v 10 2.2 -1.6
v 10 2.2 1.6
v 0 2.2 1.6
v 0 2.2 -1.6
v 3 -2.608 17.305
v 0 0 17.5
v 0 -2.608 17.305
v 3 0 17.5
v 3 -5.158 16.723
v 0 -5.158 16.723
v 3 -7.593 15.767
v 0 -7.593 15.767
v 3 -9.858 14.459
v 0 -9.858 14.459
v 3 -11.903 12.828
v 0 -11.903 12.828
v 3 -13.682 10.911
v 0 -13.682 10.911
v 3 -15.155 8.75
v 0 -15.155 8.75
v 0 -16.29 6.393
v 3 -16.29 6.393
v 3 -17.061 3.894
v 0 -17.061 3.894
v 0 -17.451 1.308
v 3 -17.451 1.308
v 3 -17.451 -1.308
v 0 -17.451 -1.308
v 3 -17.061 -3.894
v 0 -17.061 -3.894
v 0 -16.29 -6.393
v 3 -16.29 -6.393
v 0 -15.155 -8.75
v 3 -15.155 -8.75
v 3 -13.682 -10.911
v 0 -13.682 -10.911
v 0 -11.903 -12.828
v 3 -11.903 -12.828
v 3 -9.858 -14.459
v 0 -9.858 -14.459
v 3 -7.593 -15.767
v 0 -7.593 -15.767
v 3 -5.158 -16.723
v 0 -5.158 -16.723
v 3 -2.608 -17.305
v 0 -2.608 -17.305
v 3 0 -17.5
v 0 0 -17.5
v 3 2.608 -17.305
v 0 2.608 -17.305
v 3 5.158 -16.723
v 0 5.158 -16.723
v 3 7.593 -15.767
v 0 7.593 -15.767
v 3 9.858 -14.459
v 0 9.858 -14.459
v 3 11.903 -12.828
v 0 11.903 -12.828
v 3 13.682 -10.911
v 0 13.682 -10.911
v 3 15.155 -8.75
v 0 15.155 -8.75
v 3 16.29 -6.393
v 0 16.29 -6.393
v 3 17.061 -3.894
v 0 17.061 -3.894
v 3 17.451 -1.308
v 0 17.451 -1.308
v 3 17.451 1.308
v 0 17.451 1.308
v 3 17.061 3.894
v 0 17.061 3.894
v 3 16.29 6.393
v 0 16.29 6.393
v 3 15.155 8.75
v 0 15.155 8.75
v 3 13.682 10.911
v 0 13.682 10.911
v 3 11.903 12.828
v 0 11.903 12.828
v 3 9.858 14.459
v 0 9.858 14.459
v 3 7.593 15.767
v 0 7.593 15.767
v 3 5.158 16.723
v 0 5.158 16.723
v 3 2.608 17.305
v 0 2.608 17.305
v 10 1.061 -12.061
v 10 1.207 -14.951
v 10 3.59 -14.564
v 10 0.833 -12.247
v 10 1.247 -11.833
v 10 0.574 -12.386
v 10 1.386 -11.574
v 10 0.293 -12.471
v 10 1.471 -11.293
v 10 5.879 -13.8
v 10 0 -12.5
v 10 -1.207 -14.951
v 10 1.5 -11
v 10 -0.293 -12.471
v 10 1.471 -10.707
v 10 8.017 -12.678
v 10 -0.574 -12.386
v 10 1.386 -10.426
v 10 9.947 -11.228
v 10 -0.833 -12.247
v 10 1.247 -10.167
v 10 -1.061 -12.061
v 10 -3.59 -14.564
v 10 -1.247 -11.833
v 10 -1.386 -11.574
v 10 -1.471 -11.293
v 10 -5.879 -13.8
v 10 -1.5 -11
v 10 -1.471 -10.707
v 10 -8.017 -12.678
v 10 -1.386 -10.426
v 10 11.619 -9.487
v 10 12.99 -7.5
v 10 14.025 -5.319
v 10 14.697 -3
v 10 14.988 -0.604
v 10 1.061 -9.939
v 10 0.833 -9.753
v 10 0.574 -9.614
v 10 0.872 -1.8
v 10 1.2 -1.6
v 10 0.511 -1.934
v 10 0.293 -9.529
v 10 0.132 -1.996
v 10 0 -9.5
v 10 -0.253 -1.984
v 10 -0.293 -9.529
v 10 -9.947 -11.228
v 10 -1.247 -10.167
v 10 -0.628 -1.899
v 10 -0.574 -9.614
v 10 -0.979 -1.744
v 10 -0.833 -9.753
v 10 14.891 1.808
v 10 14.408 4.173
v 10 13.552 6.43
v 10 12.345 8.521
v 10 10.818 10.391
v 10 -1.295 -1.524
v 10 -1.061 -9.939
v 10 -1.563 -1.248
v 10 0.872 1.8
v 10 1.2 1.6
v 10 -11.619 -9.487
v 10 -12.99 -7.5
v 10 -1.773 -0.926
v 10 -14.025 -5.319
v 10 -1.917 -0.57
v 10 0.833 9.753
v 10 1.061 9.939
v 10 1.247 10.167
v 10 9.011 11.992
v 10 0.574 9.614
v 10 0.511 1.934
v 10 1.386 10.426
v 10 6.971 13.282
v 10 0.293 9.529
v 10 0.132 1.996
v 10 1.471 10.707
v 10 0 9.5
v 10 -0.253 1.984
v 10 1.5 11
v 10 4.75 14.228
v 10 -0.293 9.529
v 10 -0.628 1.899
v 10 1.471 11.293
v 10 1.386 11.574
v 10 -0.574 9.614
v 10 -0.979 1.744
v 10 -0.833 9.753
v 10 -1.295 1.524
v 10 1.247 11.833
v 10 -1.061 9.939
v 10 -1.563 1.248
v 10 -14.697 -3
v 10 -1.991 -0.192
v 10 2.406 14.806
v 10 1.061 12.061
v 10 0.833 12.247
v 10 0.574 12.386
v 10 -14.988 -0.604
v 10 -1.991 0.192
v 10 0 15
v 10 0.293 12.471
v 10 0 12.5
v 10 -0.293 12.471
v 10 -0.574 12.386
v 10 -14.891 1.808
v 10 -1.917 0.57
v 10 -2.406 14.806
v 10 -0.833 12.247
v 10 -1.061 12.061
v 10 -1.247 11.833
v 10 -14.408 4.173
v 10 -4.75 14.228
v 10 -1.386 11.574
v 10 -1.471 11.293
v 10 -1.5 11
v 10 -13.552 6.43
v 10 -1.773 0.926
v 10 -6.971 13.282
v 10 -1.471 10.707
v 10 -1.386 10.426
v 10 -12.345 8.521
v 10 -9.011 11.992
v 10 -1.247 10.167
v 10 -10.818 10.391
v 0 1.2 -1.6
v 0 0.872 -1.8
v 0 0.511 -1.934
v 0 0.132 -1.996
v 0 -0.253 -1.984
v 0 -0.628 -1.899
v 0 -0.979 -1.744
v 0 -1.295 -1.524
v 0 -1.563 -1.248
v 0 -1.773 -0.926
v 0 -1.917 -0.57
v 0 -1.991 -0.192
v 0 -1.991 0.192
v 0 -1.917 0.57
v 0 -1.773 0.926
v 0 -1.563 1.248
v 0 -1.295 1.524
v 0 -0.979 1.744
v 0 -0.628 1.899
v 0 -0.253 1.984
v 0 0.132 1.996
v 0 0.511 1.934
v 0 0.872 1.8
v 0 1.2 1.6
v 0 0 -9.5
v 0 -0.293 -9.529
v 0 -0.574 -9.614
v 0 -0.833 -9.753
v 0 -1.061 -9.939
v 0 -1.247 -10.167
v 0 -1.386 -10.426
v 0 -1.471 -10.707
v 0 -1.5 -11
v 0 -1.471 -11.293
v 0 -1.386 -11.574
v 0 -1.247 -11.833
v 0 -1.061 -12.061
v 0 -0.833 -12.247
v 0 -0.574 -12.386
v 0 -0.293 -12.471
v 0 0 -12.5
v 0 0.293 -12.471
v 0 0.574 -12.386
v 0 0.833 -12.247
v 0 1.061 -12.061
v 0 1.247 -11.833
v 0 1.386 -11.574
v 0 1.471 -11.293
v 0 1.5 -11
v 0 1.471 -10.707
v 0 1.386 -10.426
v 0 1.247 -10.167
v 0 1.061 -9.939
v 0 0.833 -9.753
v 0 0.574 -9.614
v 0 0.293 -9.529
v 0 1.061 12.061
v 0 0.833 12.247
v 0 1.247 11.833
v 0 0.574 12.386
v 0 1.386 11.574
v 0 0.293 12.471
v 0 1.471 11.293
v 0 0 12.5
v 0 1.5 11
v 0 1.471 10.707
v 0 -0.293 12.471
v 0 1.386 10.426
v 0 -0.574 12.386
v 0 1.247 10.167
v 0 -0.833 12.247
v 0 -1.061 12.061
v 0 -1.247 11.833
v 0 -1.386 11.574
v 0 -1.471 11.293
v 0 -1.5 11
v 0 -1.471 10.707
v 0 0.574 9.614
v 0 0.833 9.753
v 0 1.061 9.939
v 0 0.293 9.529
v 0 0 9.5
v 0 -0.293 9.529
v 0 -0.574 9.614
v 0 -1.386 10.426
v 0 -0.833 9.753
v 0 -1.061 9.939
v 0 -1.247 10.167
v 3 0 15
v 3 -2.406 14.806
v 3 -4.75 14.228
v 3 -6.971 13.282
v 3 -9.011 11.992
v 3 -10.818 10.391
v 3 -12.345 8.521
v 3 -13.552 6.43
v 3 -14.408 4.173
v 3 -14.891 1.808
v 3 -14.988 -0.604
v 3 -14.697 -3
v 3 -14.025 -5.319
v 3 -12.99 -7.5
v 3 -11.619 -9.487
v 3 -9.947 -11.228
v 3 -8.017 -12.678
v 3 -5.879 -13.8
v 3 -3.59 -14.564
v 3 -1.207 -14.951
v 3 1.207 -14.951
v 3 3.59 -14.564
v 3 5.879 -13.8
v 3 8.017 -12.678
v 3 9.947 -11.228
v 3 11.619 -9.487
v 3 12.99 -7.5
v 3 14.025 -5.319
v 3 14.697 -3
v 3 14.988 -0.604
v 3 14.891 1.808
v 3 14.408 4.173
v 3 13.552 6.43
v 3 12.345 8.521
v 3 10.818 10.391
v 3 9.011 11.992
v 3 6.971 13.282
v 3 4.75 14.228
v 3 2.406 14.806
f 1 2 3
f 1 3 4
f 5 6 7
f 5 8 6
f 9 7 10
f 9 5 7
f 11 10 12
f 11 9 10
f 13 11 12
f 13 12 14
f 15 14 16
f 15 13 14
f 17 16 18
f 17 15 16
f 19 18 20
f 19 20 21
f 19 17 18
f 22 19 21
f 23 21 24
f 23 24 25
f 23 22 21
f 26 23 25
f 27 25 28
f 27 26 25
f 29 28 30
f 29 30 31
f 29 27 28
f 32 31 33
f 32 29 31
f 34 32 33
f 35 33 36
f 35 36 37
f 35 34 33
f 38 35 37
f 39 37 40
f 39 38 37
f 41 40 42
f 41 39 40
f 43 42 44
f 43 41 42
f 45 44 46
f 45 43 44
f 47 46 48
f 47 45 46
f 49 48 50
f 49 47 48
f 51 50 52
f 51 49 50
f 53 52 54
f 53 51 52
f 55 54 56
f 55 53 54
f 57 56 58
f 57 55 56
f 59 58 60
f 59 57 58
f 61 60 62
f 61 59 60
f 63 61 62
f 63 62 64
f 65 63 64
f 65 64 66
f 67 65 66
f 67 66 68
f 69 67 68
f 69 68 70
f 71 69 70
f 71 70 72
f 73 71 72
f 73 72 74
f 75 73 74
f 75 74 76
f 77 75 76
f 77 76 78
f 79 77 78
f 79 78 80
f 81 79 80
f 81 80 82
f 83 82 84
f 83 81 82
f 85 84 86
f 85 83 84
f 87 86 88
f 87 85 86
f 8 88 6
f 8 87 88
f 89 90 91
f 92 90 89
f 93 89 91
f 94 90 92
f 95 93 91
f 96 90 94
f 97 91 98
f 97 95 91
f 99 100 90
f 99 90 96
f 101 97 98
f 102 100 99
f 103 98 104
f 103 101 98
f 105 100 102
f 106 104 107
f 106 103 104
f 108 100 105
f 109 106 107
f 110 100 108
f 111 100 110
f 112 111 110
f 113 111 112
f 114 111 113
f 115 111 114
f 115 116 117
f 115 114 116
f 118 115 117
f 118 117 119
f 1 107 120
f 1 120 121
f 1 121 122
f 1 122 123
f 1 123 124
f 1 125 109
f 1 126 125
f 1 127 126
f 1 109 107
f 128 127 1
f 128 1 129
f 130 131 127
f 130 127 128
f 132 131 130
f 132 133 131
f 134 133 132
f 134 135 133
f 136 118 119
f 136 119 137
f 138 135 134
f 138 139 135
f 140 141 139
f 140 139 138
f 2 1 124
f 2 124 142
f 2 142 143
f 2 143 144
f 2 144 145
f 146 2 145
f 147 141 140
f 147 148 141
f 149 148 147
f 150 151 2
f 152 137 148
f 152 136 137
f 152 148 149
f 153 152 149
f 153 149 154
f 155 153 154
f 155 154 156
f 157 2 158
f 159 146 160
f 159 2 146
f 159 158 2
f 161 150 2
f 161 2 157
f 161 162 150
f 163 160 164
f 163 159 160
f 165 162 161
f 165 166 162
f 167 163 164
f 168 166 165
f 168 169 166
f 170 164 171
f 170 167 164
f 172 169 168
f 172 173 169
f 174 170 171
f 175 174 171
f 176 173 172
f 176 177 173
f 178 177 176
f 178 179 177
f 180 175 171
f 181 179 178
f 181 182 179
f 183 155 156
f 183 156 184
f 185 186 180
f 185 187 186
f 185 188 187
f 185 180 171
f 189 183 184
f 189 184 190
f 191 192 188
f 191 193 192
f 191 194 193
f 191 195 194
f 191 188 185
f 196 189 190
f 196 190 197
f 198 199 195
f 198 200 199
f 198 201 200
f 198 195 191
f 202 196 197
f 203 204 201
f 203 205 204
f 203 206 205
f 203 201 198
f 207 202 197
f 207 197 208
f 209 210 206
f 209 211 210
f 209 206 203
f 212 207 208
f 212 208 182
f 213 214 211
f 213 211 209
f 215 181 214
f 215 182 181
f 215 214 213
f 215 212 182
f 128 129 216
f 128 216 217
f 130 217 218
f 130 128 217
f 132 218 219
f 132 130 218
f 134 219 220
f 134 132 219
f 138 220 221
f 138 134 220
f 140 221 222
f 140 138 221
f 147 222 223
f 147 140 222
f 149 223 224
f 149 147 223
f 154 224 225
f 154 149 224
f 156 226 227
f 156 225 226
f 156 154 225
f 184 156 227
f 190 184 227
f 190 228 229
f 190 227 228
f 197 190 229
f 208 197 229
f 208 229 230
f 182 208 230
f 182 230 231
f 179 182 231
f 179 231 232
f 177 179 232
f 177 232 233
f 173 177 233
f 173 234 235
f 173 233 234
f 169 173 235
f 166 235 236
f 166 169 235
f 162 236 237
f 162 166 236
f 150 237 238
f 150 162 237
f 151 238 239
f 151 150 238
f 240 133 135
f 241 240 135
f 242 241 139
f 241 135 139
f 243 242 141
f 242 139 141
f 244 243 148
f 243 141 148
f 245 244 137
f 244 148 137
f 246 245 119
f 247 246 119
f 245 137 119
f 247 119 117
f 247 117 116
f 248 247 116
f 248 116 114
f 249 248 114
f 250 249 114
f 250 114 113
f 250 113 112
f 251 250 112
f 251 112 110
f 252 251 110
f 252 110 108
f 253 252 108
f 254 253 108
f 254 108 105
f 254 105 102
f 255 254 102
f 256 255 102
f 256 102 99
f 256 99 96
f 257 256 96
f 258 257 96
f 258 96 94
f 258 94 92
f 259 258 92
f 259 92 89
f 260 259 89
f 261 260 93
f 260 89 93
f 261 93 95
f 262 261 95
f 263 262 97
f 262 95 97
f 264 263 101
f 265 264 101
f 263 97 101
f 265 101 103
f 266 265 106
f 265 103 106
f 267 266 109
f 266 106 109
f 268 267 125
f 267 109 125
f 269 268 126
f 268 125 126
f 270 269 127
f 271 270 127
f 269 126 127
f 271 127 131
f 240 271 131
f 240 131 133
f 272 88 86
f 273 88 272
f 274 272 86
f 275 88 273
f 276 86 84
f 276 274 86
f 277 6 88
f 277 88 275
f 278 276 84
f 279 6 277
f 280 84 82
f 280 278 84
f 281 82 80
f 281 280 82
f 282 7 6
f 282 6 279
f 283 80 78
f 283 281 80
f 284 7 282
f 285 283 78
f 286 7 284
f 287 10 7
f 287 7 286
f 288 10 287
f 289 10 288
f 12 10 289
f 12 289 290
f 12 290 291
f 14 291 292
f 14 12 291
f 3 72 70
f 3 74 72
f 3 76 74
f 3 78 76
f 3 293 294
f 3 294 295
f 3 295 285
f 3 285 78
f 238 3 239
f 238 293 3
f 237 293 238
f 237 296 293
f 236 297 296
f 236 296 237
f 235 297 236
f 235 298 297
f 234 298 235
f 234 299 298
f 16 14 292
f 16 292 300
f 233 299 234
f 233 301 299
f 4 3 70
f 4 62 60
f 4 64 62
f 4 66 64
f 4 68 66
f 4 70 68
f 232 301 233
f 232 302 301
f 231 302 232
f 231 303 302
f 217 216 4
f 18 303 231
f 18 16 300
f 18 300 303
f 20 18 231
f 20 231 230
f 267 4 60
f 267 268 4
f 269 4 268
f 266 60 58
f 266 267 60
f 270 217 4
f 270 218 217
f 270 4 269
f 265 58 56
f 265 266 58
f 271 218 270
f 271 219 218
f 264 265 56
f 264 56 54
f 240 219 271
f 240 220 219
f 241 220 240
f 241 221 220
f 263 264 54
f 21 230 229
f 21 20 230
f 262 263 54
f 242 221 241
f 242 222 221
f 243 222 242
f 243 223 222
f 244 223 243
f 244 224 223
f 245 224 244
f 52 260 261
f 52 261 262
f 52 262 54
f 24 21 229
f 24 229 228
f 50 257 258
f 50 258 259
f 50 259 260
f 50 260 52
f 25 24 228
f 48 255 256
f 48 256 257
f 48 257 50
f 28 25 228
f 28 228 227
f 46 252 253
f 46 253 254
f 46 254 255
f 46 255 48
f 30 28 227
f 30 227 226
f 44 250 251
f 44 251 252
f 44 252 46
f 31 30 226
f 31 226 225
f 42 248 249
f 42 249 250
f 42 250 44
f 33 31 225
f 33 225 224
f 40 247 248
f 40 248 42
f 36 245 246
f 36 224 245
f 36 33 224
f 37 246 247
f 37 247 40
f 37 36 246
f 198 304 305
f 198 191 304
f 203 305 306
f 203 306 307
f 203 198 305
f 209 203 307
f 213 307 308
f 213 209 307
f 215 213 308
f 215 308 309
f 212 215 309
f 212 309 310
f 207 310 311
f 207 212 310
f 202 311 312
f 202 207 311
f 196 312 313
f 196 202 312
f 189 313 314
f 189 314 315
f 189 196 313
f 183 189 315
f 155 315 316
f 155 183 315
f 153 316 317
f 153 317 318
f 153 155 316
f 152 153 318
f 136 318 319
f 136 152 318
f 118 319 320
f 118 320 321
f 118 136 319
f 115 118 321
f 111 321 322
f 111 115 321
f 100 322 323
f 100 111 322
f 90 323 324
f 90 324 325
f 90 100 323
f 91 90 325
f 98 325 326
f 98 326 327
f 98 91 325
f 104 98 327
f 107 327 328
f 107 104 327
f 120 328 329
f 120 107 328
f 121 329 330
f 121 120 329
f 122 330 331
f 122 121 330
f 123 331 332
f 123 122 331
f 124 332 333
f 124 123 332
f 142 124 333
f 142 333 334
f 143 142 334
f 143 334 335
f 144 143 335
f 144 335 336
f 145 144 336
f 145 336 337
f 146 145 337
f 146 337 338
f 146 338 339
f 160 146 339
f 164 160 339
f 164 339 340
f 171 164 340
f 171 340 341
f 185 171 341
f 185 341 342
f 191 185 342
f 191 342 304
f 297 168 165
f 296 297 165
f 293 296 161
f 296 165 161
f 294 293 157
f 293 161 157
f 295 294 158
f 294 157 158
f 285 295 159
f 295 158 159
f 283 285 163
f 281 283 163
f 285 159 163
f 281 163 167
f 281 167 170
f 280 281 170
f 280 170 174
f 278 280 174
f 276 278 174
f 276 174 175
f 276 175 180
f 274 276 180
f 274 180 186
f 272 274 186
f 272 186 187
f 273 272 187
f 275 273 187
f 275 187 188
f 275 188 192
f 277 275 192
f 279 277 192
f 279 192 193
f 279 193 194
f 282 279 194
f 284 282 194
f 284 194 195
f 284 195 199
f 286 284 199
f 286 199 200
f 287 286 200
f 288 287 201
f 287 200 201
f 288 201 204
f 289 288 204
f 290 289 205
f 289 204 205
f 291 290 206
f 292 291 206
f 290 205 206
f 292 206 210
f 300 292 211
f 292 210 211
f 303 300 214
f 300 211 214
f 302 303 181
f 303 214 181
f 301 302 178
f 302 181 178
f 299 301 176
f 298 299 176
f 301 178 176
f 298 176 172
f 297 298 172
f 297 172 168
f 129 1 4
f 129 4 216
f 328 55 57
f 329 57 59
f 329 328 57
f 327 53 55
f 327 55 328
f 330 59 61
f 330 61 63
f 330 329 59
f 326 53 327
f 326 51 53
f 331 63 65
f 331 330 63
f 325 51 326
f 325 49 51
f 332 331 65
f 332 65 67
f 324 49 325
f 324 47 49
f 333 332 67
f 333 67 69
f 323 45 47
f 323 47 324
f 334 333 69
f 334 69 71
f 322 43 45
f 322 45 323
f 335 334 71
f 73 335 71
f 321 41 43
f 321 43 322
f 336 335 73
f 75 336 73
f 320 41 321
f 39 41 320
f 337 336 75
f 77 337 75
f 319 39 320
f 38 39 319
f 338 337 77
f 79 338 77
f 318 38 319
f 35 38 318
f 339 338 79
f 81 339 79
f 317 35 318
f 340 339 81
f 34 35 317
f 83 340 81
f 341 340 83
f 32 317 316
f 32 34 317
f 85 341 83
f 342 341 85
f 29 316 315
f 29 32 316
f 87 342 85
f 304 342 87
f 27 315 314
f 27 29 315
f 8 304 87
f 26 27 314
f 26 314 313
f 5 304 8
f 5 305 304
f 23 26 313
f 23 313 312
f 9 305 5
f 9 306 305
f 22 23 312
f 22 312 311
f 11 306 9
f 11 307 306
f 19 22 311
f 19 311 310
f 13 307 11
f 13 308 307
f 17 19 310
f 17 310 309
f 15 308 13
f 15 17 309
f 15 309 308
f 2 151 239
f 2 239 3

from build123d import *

# Parameters (mm, degrees)
SKETCH2_R          = 1.5
CUT_EXTRUDE1_DEPTH = 27.69269563


with BuildPart() as part:
    # Sketch1 → Revolve1 (revolve)
    with BuildSketch(Plane.XY, mode=Mode.PRIVATE) as revolve1_sk:
        Polygon((0, 0), (0, 17.5), (3, 17.5), (3, 15), (10, 15), (10, 0), align=None)
    revolve(revolve1_sk.sketch.rotate(Axis((0, 0, 0), (1, 0, 0)), 90), axis=Axis((0, 0, 0), (1, 0, 0)))

    # Sketch2 → Cut-Extrude1 (cut, through all)
    with BuildSketch(Plane(origin=(10, 0, 0), x_dir=(0, 0, -1), z_dir=(1, 0, 0))):
        with Locations((-11, 0)):
            Circle(SKETCH2_R)
        with Locations(Location((11, 0, 0), (0, 0, 180))):
            Circle(SKETCH2_R)
        with BuildLine():
            Line((-1.6, 1.2), (-1.6, 2.2))
            Line((-1.6, 2.2), (1.6, 2.2))
            Line((1.6, 2.2), (1.6, 1.2))
            ThreePointArc((1.6, 1.2), (0, -2), (-1.6, 1.2))
        make_face()
    extrude(amount=-CUT_EXTRUDE1_DEPTH, mode=Mode.SUBTRACT)


solid = part.part
